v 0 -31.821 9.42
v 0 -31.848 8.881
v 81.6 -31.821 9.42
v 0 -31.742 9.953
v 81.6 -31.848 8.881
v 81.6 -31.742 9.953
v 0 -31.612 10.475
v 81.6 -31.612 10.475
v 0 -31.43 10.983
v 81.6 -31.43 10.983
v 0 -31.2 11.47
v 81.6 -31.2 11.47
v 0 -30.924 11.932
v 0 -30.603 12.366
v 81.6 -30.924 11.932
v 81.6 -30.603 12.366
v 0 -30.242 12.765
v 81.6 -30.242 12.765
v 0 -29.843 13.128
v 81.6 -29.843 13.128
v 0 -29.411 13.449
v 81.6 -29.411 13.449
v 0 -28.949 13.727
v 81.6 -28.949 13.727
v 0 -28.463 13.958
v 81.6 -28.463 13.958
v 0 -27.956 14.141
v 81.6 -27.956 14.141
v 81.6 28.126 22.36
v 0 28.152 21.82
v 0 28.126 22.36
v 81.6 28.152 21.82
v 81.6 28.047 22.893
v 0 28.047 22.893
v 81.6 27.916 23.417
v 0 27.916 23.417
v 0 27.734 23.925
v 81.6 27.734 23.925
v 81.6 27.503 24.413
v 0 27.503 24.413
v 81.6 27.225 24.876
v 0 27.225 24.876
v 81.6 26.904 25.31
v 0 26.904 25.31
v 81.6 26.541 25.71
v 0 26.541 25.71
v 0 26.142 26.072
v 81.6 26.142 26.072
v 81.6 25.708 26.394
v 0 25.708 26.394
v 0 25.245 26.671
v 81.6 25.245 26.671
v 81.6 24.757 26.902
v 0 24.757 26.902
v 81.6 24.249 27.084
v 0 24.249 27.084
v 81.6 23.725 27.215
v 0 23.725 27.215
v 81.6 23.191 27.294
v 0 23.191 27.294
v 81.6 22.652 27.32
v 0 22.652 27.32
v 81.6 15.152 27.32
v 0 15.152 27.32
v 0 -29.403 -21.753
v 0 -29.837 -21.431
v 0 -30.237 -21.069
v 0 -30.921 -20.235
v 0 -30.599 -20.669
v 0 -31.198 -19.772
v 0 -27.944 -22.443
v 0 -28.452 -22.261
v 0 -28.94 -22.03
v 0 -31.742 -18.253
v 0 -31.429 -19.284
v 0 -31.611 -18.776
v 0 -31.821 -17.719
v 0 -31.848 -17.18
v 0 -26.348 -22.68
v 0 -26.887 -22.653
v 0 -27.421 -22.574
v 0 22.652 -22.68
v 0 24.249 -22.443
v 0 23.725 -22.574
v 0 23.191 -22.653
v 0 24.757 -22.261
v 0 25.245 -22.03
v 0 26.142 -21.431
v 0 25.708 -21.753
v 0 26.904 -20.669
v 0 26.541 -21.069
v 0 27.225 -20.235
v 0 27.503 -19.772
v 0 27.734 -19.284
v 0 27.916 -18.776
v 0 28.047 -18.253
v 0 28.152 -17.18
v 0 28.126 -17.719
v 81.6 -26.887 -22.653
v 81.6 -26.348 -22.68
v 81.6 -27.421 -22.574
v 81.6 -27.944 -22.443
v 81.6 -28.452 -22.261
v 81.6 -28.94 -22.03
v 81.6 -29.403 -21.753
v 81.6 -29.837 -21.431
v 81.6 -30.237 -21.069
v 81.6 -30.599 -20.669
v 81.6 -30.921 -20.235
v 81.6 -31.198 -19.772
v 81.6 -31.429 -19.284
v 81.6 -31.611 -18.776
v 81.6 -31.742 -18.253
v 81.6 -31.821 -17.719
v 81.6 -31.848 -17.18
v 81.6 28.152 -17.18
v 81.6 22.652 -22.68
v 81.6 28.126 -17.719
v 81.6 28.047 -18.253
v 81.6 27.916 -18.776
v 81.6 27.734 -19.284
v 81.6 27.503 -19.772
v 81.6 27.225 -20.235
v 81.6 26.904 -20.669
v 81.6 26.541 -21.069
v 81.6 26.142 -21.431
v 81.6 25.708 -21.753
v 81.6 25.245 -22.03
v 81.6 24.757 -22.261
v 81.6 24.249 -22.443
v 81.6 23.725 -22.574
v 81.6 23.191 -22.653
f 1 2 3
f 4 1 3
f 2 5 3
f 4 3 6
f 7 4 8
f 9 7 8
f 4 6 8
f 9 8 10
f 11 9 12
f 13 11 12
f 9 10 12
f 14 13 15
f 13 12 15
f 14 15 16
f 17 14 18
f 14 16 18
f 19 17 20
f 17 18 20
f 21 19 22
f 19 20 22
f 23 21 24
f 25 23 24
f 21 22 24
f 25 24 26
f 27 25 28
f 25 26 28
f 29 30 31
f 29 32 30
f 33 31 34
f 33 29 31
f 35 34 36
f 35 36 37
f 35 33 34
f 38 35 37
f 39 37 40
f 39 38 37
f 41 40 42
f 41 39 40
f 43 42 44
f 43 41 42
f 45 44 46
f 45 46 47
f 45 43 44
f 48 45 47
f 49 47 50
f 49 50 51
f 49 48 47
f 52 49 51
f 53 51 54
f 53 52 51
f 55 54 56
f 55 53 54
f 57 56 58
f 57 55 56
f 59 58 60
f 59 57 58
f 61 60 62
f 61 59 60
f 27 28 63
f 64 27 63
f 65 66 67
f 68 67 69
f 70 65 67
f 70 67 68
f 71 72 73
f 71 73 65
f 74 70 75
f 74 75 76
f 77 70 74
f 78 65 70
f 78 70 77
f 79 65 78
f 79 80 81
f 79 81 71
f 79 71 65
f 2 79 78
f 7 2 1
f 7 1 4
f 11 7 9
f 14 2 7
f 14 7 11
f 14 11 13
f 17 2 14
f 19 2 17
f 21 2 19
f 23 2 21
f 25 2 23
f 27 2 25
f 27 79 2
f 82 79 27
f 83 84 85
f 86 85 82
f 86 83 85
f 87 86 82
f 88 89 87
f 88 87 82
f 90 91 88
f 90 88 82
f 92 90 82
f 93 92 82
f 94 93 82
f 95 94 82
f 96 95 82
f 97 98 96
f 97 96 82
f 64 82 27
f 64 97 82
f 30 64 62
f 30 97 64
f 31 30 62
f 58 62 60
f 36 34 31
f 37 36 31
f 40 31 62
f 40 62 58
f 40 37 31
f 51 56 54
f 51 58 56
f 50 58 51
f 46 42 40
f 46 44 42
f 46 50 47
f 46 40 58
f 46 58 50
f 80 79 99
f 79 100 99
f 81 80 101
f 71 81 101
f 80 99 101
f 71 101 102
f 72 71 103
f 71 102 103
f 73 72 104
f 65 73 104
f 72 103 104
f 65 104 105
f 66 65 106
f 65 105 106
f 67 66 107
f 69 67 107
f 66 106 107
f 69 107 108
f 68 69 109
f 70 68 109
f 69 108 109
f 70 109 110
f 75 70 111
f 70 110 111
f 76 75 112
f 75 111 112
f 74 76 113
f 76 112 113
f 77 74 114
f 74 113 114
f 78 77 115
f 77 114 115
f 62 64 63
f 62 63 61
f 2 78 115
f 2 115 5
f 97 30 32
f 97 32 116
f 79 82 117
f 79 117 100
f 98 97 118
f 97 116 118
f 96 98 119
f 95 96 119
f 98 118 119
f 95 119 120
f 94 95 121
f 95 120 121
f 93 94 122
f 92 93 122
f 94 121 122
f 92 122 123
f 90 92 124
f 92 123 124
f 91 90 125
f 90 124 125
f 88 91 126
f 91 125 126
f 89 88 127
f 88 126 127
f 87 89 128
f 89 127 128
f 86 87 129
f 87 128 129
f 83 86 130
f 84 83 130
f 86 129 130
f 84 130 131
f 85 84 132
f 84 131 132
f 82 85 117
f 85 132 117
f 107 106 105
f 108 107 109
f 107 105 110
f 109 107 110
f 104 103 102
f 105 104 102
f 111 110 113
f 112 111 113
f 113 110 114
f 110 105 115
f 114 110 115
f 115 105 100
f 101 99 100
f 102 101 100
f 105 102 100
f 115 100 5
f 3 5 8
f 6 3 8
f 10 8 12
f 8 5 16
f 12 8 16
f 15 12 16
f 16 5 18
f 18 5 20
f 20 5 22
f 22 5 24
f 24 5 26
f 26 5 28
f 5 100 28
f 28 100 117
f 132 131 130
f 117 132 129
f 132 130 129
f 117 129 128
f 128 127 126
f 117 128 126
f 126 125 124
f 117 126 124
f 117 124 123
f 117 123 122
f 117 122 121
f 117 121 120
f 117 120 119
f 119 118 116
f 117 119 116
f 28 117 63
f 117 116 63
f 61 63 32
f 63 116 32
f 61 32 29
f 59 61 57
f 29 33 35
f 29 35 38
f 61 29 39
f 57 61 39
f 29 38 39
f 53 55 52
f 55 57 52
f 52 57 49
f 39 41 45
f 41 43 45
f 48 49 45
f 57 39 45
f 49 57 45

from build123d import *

# Parameters (mm, degrees)
BOSS_EXTRUDE1_DEPTH = 81.6
FILLET1_R           = 5.5


with BuildPart() as part:
    # Sketch1 → Boss-Extrude1 (new body)
    with BuildSketch(Plane(origin=(0, 0, 0), x_dir=(0, 0, -1), z_dir=(1, 0, 0))):
        Polygon((-27.320490368, 28.152364273), (22.679509632, 28.152364273), (22.679509632, -31.847635727), (-12.951148339, -31.847635727), (-27.320490368, 15.152364273), align=None)
    extrude(amount=BOSS_EXTRUDE1_DEPTH)

    # Fillet1
    fillet1_edges = [part.edges().sort_by_distance(p)[0] for p in [
        (40.8, 28.152364273, 27.320490368),
        (40.8, 28.152364273, -22.679509632),
        (40.8, -31.847635727, -22.679509632),
        (40.8, -31.847635727, 12.951148339),
    ]]
    fillet(fillet1_edges, radius=FILLET1_R)


solid = part.part
